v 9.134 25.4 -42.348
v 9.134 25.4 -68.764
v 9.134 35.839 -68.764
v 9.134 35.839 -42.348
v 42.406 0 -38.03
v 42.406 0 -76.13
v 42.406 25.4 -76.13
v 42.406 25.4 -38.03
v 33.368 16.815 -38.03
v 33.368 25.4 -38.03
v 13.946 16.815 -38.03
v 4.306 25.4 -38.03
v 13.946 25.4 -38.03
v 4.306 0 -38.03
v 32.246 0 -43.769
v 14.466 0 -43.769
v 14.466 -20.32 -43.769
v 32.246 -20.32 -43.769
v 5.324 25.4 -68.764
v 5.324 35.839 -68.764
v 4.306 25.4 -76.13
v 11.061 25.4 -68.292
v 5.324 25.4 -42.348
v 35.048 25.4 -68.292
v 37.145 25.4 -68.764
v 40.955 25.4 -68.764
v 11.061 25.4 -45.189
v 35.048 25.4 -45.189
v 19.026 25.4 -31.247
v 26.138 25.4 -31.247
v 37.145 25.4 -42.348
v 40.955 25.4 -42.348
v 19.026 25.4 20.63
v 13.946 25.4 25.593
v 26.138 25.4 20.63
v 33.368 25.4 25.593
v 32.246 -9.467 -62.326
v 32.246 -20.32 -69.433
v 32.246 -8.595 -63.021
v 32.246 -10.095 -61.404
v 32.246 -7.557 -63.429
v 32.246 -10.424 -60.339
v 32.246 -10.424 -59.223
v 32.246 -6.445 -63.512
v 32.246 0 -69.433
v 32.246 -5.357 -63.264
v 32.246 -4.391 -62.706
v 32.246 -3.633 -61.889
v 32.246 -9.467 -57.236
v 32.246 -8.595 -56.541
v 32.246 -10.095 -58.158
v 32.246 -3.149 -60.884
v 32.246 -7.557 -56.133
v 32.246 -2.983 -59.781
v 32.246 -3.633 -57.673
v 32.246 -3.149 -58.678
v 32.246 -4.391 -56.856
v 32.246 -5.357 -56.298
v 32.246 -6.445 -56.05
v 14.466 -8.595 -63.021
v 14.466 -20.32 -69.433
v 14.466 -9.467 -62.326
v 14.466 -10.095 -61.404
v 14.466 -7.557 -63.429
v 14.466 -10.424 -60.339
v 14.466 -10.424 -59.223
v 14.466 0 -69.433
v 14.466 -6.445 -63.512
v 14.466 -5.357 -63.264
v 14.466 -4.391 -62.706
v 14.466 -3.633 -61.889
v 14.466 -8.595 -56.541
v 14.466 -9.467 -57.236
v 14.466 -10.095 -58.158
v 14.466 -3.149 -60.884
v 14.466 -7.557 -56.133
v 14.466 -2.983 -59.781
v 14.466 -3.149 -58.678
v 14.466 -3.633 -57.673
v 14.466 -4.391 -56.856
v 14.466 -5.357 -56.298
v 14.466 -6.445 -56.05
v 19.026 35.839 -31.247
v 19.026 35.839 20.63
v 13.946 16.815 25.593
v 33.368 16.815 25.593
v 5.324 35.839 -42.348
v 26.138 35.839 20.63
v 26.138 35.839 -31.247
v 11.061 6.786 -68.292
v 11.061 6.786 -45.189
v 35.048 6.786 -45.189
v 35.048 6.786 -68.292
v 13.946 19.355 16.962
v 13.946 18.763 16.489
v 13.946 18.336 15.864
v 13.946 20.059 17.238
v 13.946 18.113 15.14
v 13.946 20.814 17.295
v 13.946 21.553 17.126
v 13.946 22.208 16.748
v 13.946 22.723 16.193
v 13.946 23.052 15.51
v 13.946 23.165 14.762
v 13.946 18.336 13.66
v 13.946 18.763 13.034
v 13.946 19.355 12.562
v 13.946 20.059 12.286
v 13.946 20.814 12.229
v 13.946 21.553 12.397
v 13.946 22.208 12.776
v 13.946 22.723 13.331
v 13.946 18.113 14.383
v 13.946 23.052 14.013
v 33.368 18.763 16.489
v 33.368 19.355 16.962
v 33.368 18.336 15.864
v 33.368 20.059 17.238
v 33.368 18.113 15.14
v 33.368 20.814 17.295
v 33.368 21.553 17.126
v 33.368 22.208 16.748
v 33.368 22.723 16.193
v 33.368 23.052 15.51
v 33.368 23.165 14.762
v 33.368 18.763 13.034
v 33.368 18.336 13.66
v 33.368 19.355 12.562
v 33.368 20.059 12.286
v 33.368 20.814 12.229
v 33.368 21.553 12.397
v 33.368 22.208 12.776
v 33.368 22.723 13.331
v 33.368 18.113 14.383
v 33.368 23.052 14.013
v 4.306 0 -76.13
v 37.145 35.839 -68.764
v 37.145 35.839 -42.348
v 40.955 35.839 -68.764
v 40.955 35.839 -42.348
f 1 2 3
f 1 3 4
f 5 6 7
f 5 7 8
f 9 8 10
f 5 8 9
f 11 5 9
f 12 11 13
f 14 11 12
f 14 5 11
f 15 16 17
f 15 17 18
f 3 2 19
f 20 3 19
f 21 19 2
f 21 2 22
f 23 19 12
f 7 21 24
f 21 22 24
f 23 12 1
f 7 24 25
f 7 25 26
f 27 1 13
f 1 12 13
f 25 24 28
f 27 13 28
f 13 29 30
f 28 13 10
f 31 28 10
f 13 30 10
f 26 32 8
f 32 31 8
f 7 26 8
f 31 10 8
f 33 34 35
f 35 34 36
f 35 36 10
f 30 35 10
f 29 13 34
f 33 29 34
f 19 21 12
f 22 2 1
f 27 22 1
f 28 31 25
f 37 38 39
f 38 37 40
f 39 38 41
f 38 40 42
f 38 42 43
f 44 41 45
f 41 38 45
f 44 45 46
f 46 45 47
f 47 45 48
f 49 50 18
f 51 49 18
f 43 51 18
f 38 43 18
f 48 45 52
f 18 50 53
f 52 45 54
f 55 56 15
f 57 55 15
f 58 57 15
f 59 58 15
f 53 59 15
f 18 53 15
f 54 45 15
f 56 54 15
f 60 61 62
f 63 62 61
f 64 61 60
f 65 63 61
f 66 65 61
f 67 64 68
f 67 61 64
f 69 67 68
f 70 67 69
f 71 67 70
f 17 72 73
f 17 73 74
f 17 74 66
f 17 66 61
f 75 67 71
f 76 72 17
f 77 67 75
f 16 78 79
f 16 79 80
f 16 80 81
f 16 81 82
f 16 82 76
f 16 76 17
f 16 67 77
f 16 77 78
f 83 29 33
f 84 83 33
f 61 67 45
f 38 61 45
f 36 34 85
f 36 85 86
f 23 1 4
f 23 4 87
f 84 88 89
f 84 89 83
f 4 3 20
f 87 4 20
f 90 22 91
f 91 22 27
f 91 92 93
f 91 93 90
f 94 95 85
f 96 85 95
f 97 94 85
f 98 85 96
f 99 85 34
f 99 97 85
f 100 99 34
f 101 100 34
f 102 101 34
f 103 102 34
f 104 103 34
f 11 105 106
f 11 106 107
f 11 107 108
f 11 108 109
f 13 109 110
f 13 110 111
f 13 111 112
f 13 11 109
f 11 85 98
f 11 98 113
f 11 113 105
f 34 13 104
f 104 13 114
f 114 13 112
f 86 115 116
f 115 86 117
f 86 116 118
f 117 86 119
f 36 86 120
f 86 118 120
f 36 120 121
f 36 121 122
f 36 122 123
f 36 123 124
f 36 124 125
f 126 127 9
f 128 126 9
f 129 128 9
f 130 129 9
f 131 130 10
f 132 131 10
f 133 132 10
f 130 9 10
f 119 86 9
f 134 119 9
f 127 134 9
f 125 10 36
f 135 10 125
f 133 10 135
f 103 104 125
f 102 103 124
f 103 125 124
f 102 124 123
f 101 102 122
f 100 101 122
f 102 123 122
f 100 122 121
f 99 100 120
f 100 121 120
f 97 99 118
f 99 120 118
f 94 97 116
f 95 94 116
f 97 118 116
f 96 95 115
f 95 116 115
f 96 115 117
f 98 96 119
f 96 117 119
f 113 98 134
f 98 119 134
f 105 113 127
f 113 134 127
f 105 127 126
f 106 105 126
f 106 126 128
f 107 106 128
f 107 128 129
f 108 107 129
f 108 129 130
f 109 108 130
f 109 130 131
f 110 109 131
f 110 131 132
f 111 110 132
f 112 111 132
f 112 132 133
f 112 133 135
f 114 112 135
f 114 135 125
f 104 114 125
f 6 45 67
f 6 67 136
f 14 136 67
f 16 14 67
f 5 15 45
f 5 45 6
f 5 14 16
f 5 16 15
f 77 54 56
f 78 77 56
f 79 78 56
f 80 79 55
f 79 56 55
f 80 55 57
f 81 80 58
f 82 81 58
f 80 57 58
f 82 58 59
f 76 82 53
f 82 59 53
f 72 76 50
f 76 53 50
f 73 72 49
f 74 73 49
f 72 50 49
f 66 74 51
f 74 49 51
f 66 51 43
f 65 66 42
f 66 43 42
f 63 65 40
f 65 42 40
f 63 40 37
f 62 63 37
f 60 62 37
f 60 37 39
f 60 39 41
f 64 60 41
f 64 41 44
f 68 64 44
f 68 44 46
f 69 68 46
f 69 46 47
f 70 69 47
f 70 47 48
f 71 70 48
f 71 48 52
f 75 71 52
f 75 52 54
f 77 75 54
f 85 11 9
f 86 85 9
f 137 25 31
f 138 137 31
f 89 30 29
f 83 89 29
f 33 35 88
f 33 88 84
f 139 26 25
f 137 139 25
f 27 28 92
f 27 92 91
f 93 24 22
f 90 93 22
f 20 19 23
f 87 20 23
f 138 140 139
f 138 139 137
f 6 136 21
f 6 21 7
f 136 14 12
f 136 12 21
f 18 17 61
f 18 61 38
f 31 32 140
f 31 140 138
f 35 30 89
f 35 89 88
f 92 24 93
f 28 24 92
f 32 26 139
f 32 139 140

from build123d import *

# Parameters (mm, degrees)
F0_R       = 12.7
F1_DEPTH   = 25.4
F2_W       = 19.4218531251
F2_H       = 8.5854552031
F3_DEPTH   = 63.6221766472
F4_W       = 23.9879162983
F4_H       = 23.1030732393
F1_FACE1_W = 38.1
F1_FACE1_H = 38.1
F5_DEPTH   = 18.6139512807
F6_R       = 2.54
F7_DEPTH   = 25.4
F8_W       = 3.81
F8_H       = 26.416
F9_DEPTH   = 10.4394
F10_W      = 17.78
F10_H      = 25.6636217237
F11_DEPTH  = 20.32
F12_R      = 3.7416241703
F13_DEPTH  = 25.4
F14_W      = 7.112
F14_H      = 51.8768767775
F15_DEPTH  = 10.4394


with BuildPart() as f1:
    # F0 (on Front) → F1 (new body)
    with BuildSketch(Plane.XZ):
        Polygon((42.4058387152, -38.0295165001), (4.3058387152, -38.0295165001), (4.3058387152, -76.1295165001), (42.4058387152, -76.1295165001), (42.4058387152, -57.0795165001), align=None)
        with Locations((29.7058387152, -57.0795165001)):
            Circle(F0_R, mode=Mode.SUBTRACT)
        with Locations((29.7058387152, -57.0795165001)):
            Circle(F0_R)
    extrude(amount=-F1_DEPTH)

    # F2 (on face) → F3 (join)
    with BuildSketch(Plane.XY.offset(-38.0295165001)):
        with Locations((23.6573927104, 21.1072723985)):
            Rectangle(F2_W, F2_H)
    extrude(amount=F3_DEPTH)

    # F4 (on face) + F1_face1 (on face) → F5 (cut)
    with BuildSketch(Plane(origin=(0, 25.4, 0), x_dir=(-1, 0, 0), z_dir=(0, 1, 0))):
        with Locations((-23.0544968509, -56.7404404283)):
            Rectangle(F4_W, F4_H)
    with BuildSketch(Plane(origin=(23.3558387152, 0, -57.0795165001), x_dir=(1, 0, 0), z_dir=(0, -1, 0))):
        Rectangle(F1_FACE1_W, F1_FACE1_H)
    extrude(amount=-F5_DEPTH, dir=(0, 1, 0), mode=Mode.SUBTRACT)

    # F6 (on face) → F7 (cut)
    with BuildSketch(Plane.YZ.offset(33.368319273)):
        with Locations((20.6245447969, 14.7618185729)):
            Circle(F6_R)
    extrude(amount=-F7_DEPTH, mode=Mode.SUBTRACT)

    # F8 (on face) → F9 (join)
    with BuildSketch(Plane(origin=(0, 25.4, 0), x_dir=(-1, 0, 0), z_dir=(0, 1, 0))):
        with Locations((-7.2288869413, -55.5555165001)):
            Rectangle(F8_W, F8_H)
        with Locations((-39.0500968931, -55.5555165001)):
            Rectangle(F8_W, F8_H)
    extrude(amount=F9_DEPTH)

    # F10 (on face) → F11 (join)
    with BuildSketch(Plane.XZ):
        with Locations((23.3558387152, -56.6011555493)):
            Rectangle(F10_W, F10_H)
    extrude(amount=F11_DEPTH)

    # F12 (on face) → F13 (cut)
    with BuildSketch(Plane.YZ.offset(32.2458387152)):
        with Locations((-6.7241610959, -59.7809664111)):
            Circle(F12_R)
    extrude(amount=-F13_DEPTH, mode=Mode.SUBTRACT)

    # F14 (on face) → F15 (join)
    with BuildSketch(Plane(origin=(0, 25.4, 0), x_dir=(-1, 0, 0), z_dir=(0, 1, 0))):
        with Locations((-22.5824661479, -5.3084390238)):
            Rectangle(F14_W, F14_H)
    extrude(amount=F15_DEPTH)


solid = f1.part
